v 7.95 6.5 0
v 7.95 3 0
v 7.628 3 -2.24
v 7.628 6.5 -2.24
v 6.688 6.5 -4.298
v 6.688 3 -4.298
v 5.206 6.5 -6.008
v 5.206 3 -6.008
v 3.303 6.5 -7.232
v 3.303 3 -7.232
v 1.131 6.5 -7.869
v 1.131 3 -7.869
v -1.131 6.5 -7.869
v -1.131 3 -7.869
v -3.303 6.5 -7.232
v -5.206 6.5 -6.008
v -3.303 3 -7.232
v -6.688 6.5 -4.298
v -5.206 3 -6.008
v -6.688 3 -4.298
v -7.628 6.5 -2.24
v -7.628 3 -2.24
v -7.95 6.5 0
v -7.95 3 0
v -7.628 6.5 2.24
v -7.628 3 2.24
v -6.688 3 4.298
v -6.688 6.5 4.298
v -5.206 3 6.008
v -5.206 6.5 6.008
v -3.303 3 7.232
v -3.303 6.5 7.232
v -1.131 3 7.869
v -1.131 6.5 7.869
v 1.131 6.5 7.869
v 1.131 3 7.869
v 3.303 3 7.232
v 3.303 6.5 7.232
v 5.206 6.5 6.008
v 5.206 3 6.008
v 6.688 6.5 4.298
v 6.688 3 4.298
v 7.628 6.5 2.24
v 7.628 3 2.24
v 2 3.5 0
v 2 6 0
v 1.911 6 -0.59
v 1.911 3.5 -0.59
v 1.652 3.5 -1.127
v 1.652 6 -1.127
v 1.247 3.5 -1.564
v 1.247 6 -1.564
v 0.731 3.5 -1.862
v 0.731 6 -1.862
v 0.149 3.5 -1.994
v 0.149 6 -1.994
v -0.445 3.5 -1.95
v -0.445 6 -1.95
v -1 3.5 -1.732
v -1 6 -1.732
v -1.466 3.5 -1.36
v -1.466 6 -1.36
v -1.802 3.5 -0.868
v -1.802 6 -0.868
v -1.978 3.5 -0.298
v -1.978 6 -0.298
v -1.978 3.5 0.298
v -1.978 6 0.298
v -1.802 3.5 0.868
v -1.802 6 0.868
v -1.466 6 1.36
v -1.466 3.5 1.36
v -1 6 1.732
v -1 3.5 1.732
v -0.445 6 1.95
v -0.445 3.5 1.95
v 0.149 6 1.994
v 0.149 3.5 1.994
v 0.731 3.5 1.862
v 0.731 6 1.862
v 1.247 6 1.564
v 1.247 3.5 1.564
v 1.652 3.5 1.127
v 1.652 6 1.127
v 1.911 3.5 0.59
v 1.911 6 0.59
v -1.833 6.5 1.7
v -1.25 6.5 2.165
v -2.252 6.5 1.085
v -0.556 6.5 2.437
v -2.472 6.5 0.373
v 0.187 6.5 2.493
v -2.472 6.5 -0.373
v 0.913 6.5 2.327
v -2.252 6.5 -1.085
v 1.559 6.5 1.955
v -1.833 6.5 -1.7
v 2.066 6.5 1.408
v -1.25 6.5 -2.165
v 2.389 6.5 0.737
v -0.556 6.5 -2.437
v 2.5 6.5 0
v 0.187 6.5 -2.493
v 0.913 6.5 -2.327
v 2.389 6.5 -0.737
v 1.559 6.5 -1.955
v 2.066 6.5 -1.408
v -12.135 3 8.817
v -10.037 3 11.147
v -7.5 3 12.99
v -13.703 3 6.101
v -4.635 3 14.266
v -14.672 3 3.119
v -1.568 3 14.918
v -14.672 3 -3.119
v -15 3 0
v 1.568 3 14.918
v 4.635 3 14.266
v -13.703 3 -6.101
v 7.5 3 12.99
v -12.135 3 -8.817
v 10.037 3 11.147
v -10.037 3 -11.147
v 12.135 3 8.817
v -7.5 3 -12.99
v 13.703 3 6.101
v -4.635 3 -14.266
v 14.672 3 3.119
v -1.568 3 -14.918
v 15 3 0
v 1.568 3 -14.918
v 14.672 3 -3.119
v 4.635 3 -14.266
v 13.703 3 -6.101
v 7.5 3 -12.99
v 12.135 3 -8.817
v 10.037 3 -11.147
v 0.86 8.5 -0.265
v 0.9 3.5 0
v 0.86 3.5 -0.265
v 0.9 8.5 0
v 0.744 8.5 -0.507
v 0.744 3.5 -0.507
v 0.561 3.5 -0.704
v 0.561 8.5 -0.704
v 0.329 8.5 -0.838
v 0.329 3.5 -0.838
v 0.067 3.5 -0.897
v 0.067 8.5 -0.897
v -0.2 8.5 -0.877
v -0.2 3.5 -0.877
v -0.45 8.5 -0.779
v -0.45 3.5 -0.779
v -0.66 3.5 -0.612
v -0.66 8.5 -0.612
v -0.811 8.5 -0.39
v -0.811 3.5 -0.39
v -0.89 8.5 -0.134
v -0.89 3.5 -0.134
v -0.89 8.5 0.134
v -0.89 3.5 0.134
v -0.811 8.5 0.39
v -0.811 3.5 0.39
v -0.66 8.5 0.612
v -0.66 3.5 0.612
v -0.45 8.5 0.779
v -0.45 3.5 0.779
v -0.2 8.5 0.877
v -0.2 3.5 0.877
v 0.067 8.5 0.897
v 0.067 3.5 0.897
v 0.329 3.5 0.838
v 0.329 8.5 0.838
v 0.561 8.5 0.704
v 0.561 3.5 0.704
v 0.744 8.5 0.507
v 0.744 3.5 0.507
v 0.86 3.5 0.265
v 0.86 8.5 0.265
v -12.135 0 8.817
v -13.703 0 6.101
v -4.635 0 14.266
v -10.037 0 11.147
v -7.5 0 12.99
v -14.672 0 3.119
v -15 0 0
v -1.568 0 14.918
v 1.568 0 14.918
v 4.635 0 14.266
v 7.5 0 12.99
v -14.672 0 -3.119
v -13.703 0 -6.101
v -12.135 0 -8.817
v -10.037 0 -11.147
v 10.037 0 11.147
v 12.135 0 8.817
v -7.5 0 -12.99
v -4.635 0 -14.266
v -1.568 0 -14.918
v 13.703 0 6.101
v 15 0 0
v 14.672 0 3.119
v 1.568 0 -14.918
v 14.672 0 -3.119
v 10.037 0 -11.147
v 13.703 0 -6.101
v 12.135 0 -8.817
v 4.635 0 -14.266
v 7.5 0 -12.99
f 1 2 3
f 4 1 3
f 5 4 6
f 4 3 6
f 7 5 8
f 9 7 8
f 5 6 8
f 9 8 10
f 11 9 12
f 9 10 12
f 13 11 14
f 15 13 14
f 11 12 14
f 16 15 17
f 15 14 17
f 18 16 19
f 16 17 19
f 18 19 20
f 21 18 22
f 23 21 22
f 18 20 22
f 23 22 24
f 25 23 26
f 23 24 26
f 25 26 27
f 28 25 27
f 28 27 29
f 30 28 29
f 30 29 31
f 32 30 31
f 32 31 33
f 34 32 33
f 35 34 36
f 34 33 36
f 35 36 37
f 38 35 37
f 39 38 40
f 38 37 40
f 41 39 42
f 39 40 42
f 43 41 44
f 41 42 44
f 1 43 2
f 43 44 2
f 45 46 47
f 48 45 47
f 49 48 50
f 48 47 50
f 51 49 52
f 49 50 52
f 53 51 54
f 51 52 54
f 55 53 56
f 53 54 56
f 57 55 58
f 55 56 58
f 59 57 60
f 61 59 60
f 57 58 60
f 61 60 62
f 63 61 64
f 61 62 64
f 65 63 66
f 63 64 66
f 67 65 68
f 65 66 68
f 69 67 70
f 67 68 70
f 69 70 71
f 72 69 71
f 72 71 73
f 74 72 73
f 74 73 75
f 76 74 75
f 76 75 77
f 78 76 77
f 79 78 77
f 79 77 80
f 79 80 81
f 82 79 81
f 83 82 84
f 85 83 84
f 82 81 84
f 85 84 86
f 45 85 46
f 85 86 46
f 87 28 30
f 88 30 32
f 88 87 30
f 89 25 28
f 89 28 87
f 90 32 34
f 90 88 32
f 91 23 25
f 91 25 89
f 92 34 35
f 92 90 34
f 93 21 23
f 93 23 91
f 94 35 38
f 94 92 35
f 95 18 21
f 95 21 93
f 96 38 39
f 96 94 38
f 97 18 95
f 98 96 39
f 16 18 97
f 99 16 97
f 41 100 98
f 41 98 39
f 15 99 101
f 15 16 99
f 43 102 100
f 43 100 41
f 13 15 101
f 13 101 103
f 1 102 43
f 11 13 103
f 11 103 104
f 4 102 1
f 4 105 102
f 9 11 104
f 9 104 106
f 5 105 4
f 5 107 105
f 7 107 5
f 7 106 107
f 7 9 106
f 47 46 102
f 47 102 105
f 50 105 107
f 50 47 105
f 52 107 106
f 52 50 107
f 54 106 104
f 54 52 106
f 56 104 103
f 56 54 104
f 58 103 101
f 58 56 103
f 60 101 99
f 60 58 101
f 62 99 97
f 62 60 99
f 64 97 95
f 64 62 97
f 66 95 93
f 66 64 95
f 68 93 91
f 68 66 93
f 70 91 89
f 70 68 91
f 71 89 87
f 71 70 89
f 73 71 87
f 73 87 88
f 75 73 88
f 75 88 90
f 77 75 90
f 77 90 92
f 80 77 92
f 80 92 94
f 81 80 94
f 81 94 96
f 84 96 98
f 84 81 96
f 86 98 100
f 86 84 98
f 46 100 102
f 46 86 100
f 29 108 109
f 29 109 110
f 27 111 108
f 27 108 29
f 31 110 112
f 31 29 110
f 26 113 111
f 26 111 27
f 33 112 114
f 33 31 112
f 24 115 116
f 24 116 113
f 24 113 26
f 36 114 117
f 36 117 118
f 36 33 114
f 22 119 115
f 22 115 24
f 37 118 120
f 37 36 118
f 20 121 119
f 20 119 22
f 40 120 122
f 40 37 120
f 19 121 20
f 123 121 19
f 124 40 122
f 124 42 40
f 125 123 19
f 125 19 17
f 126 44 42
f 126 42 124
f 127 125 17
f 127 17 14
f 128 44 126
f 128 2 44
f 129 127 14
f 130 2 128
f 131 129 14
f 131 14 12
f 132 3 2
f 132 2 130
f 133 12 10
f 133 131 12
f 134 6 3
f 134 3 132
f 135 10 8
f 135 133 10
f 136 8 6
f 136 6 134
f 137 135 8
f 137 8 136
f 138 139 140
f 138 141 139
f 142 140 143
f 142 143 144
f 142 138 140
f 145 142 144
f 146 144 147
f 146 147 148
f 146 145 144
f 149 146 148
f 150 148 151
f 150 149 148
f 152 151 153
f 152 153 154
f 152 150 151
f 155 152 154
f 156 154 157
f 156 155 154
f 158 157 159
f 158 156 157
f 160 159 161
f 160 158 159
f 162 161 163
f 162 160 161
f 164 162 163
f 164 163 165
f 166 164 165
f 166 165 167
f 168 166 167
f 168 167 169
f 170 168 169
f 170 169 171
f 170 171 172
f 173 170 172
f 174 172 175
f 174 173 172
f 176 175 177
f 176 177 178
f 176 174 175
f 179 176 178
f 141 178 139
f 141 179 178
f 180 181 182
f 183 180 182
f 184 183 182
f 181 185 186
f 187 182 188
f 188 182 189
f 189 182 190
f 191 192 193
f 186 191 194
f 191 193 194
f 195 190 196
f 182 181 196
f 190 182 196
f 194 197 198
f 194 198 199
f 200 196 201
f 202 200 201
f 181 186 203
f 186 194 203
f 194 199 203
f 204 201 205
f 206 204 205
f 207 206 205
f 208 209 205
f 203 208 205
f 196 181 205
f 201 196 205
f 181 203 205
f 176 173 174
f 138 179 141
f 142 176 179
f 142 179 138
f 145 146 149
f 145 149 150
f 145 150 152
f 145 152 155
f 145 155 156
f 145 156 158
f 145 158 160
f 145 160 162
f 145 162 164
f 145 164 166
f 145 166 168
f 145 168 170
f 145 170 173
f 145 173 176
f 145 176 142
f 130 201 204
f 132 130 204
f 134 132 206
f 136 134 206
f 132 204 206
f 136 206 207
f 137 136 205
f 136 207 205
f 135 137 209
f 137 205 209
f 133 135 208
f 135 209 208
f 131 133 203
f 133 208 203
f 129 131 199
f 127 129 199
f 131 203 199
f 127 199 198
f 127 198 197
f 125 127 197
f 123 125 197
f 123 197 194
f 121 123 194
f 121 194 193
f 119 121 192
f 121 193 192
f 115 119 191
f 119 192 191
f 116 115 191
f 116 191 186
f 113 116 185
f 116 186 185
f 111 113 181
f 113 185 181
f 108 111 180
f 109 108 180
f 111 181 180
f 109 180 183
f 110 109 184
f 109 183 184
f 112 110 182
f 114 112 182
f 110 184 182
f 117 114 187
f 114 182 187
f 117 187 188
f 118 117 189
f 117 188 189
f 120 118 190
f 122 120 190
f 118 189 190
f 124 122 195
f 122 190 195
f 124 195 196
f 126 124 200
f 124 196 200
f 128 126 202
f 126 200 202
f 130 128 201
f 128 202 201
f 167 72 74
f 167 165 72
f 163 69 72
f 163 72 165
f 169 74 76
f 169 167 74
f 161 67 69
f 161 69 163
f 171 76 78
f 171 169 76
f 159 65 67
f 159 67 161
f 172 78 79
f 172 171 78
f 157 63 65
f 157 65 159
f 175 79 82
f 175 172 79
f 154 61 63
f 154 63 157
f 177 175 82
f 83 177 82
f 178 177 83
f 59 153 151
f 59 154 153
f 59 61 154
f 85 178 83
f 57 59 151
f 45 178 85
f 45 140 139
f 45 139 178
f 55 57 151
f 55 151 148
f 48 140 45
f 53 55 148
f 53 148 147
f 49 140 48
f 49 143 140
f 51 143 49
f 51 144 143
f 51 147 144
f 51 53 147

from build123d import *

# Parameters (mm, degrees)
SKETCH_1_R          = 15
EXTRUDE_1_DEPTH     = 3
SKETCH_2_R          = 7.95
EXTRUDE_2_DEPTH     = 3.5
SKETCH_3_R          = 0.9
EXTRUDE_3_DEPTH     = 2
SKETCH_4_R          = 2
SKETCH_4_R_2        = 0.9
CUT_EXTRUDE_1_DEPTH = 3
CHAMFER_1_SIZE      = 0.5


with BuildPart() as part:
    # 草图1 → 凸台-拉伸1 (new body)
    with BuildSketch(Plane(origin=(0, 0, 0), x_dir=(1, 0, 0), z_dir=(0, 1, 0))):
        Circle(SKETCH_1_R)
    extrude(amount=EXTRUDE_1_DEPTH)

    # 草图2 → 凸台-拉伸2 (add)
    with BuildSketch(Plane(origin=(0, 3, 0), x_dir=(1, 0, 0), z_dir=(0, 1, 0))):
        Circle(SKETCH_2_R)
    extrude(amount=EXTRUDE_2_DEPTH)

    # 草图3 → 凸台-拉伸3 (add)
    with BuildSketch(Plane(origin=(0, 6.5, 0), x_dir=(1, 0, 0), z_dir=(0, 1, 0))):
        Circle(SKETCH_3_R)
    extrude(amount=EXTRUDE_3_DEPTH)

    # 草图4 → 切除-拉伸1 (cut)
    with BuildSketch(Plane(origin=(0, 6.5, 0), x_dir=(1, 0, 0), z_dir=(0, 1, 0))):
        Circle(SKETCH_4_R)
        Circle(SKETCH_4_R_2, mode=Mode.SUBTRACT)
    extrude(amount=-CUT_EXTRUDE_1_DEPTH, mode=Mode.SUBTRACT)

    # 倒角1
    chamfer_1_edges = [part.edges().sort_by_distance(p)[0] for p in [
        (-2, 6.5, 0),
    ]]
    chamfer(chamfer_1_edges, length=CHAMFER_1_SIZE)


solid = part.part
